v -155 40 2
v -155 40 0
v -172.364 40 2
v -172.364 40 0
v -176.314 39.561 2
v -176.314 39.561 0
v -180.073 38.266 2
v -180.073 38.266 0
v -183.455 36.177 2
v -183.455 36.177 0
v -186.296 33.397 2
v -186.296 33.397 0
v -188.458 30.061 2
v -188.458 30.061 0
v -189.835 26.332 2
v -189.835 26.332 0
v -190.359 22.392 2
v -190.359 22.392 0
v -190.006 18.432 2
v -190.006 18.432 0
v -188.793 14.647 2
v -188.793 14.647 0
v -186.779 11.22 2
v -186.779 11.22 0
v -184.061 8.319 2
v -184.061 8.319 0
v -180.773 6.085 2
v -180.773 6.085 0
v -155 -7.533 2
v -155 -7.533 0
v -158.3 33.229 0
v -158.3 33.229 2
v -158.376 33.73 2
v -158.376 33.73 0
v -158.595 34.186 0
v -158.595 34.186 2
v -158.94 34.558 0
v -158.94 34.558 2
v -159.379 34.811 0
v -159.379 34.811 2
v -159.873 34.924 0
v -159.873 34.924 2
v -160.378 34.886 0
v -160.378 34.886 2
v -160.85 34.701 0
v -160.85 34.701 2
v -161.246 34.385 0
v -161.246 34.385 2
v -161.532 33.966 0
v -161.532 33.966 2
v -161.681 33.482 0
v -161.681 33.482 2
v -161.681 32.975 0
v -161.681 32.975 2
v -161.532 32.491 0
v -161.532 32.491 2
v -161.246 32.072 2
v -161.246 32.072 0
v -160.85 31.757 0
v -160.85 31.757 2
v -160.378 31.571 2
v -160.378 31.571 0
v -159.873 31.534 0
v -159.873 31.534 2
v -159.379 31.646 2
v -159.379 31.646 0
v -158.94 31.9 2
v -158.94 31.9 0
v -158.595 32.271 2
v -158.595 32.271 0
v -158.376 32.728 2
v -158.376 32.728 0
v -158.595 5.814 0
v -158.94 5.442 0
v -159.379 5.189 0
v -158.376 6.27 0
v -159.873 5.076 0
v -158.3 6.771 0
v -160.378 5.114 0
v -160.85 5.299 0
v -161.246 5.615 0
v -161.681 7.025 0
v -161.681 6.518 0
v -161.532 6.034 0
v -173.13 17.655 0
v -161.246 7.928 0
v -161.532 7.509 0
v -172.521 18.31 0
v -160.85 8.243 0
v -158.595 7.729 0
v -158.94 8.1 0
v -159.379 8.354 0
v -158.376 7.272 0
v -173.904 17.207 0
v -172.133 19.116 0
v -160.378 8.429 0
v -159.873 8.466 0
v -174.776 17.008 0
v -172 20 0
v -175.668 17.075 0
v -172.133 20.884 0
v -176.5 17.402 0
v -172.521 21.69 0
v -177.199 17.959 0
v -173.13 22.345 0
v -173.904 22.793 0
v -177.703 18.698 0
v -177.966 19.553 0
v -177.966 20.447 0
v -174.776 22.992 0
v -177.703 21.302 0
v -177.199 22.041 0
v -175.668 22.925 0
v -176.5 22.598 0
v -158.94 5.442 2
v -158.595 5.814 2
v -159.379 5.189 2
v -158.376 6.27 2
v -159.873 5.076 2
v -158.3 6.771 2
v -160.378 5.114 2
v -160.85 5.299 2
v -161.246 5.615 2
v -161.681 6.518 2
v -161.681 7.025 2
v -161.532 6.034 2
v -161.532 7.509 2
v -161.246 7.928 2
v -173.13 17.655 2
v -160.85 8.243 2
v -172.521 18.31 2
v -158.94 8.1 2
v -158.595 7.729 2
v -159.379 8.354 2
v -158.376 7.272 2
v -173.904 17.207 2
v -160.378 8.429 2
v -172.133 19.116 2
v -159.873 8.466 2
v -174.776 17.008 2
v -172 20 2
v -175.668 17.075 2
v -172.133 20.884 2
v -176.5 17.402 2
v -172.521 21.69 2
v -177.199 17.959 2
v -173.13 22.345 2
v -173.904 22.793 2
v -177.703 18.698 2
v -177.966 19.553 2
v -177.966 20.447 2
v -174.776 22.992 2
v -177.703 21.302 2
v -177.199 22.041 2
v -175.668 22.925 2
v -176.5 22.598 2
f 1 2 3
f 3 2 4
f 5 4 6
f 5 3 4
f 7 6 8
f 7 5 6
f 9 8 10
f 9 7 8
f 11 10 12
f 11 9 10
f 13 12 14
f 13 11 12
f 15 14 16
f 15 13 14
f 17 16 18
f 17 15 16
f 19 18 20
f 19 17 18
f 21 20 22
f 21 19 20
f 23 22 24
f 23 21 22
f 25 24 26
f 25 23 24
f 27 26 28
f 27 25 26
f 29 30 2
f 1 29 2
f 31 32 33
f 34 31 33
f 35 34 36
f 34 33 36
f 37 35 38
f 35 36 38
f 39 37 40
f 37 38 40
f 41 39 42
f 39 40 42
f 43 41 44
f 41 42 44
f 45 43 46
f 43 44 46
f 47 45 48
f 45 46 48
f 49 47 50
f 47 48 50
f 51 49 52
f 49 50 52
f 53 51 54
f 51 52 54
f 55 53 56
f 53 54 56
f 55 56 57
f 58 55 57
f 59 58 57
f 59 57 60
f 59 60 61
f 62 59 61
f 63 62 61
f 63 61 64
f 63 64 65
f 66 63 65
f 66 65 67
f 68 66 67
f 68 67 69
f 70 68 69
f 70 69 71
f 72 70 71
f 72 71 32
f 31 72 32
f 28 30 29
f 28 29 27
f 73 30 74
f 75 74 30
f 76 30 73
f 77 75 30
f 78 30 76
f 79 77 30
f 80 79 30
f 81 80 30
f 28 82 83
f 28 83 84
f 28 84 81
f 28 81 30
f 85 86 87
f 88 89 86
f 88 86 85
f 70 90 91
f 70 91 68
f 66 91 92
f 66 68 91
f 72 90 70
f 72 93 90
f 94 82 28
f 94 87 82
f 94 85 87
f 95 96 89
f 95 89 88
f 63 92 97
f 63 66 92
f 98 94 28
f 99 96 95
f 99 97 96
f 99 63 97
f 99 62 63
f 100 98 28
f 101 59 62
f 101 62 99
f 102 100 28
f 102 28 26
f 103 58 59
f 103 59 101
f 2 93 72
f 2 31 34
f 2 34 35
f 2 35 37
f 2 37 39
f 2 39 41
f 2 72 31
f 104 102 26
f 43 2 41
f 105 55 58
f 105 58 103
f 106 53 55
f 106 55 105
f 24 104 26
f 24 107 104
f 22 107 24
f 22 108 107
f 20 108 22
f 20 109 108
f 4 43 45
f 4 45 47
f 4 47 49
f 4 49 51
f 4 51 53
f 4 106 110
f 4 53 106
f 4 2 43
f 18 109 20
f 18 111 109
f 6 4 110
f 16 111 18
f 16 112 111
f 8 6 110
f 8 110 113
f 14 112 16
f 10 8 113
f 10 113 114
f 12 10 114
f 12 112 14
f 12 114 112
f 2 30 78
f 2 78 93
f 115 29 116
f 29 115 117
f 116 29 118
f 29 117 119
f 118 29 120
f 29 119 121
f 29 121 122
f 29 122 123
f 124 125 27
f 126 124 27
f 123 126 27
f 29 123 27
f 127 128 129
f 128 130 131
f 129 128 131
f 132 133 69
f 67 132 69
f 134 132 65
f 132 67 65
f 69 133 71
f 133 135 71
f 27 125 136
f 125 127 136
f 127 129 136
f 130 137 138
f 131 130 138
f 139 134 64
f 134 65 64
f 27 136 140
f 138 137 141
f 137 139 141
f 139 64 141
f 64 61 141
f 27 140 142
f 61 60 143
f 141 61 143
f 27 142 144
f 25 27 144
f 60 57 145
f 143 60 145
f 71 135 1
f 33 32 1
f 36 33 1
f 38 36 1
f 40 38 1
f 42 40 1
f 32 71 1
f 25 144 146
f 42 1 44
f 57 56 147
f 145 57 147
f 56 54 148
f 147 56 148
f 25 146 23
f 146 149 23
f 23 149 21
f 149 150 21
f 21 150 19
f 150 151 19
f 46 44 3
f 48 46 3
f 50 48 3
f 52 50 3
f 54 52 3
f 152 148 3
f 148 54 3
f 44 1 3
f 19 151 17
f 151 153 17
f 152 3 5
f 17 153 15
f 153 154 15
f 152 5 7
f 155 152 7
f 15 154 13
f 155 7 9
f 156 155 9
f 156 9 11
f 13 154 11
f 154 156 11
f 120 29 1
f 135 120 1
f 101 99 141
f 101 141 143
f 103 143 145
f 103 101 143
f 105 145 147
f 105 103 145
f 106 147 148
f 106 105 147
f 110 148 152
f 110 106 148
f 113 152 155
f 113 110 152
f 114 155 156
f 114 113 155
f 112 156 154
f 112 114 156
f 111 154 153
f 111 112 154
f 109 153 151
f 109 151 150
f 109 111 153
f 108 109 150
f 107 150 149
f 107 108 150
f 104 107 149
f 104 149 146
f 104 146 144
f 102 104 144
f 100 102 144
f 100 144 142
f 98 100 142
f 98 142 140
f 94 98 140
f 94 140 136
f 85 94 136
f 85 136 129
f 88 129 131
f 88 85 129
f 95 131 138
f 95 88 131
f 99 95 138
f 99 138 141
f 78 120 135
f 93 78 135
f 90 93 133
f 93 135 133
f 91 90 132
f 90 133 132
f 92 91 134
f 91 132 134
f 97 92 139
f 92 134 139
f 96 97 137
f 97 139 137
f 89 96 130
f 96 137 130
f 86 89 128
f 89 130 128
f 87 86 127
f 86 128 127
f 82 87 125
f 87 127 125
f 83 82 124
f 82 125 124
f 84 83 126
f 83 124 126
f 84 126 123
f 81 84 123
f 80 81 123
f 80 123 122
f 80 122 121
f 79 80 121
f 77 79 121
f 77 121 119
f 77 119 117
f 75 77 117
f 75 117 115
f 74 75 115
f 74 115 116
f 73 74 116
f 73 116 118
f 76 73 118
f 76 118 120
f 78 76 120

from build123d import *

# Parameters (mm, degrees)
ESQUISSE1_R                  = 3
BOSS_EXTRU_1_DEPTH           = 2
CONG_1_R                     = 18
CONG_2_R                     = 20
ENL_V_MAT_EXTRU_2_DEPTH      = 195.530962239
ENL_V_MAT_EXTRU_2_DEPTH_BACK = 10
ESQUISSE2_W                  = 356.718168982
ESQUISSE2_H                  = 96.805953854
D_GAGEMENT_M31_D             = 3.4


with BuildPart() as part:
    # Esquisse1 → Boss.-Extru.1 (new body)
    with BuildSketch(Plane.XY):
        Polygon((-244.958991582, 40), (-110, 40), (110, 40), (244.958991582, 40), (112.479495791, -30), (-112.479495791, -30), align=None)
        with Locations((-175, 20)):
            Circle(ESQUISSE1_R, mode=Mode.SUBTRACT)
        with Locations((-110, -20)):
            Circle(ESQUISSE1_R, mode=Mode.SUBTRACT)
        with Locations((110, -20)):
            Circle(ESQUISSE1_R, mode=Mode.SUBTRACT)
        with Locations((175, 20)):
            Circle(ESQUISSE1_R, mode=Mode.SUBTRACT)
        with Locations((0, -20)):
            Circle(ESQUISSE1_R, mode=Mode.SUBTRACT)
        with Locations((-58.333333333, 20)):
            Circle(ESQUISSE1_R, mode=Mode.SUBTRACT)
        with Locations((58.333333333, 20)):
            Circle(ESQUISSE1_R, mode=Mode.SUBTRACT)
    extrude(amount=BOSS_EXTRU_1_DEPTH)

    # Congé1
    cong_1_edges = [part.edges().sort_by_distance(p)[0] for p in [
        (-244.958991582, 40, 1),
        (244.958991582, 40, 1),
    ]]
    fillet(cong_1_edges, radius=CONG_1_R)

    # Congé2
    cong_2_edges = [part.edges().sort_by_distance(p)[0] for p in [
        (112.479495791, -30, 1),
        (-112.479495791, -30, 1),
    ]]
    fillet(cong_2_edges, radius=CONG_2_R)

    # Esquisse2 → Enlèv. mat.-Extru.2 (cut, two sides: drawn at the far end of the back side and taken through both)
    with BuildSketch(Plane.XY.offset(-ENL_V_MAT_EXTRU_2_DEPTH_BACK)):
        with Locations((23.359084491, 12.745190259)):
            Rectangle(ESQUISSE2_W, ESQUISSE2_H)
    extrude(amount=ENL_V_MAT_EXTRU_2_DEPTH + ENL_V_MAT_EXTRU_2_DEPTH_BACK, mode=Mode.SUBTRACT)

    # Dégagement M31 (through all)
    with Locations(Plane(origin=(0, 0, 0), x_dir=(-1, 0, 0), z_dir=(0, 0, -1))):
        with Locations((160, 33.228756555), (160, 6.771243445)):
            Hole(D_GAGEMENT_M31_D / 2)


solid = part.part
